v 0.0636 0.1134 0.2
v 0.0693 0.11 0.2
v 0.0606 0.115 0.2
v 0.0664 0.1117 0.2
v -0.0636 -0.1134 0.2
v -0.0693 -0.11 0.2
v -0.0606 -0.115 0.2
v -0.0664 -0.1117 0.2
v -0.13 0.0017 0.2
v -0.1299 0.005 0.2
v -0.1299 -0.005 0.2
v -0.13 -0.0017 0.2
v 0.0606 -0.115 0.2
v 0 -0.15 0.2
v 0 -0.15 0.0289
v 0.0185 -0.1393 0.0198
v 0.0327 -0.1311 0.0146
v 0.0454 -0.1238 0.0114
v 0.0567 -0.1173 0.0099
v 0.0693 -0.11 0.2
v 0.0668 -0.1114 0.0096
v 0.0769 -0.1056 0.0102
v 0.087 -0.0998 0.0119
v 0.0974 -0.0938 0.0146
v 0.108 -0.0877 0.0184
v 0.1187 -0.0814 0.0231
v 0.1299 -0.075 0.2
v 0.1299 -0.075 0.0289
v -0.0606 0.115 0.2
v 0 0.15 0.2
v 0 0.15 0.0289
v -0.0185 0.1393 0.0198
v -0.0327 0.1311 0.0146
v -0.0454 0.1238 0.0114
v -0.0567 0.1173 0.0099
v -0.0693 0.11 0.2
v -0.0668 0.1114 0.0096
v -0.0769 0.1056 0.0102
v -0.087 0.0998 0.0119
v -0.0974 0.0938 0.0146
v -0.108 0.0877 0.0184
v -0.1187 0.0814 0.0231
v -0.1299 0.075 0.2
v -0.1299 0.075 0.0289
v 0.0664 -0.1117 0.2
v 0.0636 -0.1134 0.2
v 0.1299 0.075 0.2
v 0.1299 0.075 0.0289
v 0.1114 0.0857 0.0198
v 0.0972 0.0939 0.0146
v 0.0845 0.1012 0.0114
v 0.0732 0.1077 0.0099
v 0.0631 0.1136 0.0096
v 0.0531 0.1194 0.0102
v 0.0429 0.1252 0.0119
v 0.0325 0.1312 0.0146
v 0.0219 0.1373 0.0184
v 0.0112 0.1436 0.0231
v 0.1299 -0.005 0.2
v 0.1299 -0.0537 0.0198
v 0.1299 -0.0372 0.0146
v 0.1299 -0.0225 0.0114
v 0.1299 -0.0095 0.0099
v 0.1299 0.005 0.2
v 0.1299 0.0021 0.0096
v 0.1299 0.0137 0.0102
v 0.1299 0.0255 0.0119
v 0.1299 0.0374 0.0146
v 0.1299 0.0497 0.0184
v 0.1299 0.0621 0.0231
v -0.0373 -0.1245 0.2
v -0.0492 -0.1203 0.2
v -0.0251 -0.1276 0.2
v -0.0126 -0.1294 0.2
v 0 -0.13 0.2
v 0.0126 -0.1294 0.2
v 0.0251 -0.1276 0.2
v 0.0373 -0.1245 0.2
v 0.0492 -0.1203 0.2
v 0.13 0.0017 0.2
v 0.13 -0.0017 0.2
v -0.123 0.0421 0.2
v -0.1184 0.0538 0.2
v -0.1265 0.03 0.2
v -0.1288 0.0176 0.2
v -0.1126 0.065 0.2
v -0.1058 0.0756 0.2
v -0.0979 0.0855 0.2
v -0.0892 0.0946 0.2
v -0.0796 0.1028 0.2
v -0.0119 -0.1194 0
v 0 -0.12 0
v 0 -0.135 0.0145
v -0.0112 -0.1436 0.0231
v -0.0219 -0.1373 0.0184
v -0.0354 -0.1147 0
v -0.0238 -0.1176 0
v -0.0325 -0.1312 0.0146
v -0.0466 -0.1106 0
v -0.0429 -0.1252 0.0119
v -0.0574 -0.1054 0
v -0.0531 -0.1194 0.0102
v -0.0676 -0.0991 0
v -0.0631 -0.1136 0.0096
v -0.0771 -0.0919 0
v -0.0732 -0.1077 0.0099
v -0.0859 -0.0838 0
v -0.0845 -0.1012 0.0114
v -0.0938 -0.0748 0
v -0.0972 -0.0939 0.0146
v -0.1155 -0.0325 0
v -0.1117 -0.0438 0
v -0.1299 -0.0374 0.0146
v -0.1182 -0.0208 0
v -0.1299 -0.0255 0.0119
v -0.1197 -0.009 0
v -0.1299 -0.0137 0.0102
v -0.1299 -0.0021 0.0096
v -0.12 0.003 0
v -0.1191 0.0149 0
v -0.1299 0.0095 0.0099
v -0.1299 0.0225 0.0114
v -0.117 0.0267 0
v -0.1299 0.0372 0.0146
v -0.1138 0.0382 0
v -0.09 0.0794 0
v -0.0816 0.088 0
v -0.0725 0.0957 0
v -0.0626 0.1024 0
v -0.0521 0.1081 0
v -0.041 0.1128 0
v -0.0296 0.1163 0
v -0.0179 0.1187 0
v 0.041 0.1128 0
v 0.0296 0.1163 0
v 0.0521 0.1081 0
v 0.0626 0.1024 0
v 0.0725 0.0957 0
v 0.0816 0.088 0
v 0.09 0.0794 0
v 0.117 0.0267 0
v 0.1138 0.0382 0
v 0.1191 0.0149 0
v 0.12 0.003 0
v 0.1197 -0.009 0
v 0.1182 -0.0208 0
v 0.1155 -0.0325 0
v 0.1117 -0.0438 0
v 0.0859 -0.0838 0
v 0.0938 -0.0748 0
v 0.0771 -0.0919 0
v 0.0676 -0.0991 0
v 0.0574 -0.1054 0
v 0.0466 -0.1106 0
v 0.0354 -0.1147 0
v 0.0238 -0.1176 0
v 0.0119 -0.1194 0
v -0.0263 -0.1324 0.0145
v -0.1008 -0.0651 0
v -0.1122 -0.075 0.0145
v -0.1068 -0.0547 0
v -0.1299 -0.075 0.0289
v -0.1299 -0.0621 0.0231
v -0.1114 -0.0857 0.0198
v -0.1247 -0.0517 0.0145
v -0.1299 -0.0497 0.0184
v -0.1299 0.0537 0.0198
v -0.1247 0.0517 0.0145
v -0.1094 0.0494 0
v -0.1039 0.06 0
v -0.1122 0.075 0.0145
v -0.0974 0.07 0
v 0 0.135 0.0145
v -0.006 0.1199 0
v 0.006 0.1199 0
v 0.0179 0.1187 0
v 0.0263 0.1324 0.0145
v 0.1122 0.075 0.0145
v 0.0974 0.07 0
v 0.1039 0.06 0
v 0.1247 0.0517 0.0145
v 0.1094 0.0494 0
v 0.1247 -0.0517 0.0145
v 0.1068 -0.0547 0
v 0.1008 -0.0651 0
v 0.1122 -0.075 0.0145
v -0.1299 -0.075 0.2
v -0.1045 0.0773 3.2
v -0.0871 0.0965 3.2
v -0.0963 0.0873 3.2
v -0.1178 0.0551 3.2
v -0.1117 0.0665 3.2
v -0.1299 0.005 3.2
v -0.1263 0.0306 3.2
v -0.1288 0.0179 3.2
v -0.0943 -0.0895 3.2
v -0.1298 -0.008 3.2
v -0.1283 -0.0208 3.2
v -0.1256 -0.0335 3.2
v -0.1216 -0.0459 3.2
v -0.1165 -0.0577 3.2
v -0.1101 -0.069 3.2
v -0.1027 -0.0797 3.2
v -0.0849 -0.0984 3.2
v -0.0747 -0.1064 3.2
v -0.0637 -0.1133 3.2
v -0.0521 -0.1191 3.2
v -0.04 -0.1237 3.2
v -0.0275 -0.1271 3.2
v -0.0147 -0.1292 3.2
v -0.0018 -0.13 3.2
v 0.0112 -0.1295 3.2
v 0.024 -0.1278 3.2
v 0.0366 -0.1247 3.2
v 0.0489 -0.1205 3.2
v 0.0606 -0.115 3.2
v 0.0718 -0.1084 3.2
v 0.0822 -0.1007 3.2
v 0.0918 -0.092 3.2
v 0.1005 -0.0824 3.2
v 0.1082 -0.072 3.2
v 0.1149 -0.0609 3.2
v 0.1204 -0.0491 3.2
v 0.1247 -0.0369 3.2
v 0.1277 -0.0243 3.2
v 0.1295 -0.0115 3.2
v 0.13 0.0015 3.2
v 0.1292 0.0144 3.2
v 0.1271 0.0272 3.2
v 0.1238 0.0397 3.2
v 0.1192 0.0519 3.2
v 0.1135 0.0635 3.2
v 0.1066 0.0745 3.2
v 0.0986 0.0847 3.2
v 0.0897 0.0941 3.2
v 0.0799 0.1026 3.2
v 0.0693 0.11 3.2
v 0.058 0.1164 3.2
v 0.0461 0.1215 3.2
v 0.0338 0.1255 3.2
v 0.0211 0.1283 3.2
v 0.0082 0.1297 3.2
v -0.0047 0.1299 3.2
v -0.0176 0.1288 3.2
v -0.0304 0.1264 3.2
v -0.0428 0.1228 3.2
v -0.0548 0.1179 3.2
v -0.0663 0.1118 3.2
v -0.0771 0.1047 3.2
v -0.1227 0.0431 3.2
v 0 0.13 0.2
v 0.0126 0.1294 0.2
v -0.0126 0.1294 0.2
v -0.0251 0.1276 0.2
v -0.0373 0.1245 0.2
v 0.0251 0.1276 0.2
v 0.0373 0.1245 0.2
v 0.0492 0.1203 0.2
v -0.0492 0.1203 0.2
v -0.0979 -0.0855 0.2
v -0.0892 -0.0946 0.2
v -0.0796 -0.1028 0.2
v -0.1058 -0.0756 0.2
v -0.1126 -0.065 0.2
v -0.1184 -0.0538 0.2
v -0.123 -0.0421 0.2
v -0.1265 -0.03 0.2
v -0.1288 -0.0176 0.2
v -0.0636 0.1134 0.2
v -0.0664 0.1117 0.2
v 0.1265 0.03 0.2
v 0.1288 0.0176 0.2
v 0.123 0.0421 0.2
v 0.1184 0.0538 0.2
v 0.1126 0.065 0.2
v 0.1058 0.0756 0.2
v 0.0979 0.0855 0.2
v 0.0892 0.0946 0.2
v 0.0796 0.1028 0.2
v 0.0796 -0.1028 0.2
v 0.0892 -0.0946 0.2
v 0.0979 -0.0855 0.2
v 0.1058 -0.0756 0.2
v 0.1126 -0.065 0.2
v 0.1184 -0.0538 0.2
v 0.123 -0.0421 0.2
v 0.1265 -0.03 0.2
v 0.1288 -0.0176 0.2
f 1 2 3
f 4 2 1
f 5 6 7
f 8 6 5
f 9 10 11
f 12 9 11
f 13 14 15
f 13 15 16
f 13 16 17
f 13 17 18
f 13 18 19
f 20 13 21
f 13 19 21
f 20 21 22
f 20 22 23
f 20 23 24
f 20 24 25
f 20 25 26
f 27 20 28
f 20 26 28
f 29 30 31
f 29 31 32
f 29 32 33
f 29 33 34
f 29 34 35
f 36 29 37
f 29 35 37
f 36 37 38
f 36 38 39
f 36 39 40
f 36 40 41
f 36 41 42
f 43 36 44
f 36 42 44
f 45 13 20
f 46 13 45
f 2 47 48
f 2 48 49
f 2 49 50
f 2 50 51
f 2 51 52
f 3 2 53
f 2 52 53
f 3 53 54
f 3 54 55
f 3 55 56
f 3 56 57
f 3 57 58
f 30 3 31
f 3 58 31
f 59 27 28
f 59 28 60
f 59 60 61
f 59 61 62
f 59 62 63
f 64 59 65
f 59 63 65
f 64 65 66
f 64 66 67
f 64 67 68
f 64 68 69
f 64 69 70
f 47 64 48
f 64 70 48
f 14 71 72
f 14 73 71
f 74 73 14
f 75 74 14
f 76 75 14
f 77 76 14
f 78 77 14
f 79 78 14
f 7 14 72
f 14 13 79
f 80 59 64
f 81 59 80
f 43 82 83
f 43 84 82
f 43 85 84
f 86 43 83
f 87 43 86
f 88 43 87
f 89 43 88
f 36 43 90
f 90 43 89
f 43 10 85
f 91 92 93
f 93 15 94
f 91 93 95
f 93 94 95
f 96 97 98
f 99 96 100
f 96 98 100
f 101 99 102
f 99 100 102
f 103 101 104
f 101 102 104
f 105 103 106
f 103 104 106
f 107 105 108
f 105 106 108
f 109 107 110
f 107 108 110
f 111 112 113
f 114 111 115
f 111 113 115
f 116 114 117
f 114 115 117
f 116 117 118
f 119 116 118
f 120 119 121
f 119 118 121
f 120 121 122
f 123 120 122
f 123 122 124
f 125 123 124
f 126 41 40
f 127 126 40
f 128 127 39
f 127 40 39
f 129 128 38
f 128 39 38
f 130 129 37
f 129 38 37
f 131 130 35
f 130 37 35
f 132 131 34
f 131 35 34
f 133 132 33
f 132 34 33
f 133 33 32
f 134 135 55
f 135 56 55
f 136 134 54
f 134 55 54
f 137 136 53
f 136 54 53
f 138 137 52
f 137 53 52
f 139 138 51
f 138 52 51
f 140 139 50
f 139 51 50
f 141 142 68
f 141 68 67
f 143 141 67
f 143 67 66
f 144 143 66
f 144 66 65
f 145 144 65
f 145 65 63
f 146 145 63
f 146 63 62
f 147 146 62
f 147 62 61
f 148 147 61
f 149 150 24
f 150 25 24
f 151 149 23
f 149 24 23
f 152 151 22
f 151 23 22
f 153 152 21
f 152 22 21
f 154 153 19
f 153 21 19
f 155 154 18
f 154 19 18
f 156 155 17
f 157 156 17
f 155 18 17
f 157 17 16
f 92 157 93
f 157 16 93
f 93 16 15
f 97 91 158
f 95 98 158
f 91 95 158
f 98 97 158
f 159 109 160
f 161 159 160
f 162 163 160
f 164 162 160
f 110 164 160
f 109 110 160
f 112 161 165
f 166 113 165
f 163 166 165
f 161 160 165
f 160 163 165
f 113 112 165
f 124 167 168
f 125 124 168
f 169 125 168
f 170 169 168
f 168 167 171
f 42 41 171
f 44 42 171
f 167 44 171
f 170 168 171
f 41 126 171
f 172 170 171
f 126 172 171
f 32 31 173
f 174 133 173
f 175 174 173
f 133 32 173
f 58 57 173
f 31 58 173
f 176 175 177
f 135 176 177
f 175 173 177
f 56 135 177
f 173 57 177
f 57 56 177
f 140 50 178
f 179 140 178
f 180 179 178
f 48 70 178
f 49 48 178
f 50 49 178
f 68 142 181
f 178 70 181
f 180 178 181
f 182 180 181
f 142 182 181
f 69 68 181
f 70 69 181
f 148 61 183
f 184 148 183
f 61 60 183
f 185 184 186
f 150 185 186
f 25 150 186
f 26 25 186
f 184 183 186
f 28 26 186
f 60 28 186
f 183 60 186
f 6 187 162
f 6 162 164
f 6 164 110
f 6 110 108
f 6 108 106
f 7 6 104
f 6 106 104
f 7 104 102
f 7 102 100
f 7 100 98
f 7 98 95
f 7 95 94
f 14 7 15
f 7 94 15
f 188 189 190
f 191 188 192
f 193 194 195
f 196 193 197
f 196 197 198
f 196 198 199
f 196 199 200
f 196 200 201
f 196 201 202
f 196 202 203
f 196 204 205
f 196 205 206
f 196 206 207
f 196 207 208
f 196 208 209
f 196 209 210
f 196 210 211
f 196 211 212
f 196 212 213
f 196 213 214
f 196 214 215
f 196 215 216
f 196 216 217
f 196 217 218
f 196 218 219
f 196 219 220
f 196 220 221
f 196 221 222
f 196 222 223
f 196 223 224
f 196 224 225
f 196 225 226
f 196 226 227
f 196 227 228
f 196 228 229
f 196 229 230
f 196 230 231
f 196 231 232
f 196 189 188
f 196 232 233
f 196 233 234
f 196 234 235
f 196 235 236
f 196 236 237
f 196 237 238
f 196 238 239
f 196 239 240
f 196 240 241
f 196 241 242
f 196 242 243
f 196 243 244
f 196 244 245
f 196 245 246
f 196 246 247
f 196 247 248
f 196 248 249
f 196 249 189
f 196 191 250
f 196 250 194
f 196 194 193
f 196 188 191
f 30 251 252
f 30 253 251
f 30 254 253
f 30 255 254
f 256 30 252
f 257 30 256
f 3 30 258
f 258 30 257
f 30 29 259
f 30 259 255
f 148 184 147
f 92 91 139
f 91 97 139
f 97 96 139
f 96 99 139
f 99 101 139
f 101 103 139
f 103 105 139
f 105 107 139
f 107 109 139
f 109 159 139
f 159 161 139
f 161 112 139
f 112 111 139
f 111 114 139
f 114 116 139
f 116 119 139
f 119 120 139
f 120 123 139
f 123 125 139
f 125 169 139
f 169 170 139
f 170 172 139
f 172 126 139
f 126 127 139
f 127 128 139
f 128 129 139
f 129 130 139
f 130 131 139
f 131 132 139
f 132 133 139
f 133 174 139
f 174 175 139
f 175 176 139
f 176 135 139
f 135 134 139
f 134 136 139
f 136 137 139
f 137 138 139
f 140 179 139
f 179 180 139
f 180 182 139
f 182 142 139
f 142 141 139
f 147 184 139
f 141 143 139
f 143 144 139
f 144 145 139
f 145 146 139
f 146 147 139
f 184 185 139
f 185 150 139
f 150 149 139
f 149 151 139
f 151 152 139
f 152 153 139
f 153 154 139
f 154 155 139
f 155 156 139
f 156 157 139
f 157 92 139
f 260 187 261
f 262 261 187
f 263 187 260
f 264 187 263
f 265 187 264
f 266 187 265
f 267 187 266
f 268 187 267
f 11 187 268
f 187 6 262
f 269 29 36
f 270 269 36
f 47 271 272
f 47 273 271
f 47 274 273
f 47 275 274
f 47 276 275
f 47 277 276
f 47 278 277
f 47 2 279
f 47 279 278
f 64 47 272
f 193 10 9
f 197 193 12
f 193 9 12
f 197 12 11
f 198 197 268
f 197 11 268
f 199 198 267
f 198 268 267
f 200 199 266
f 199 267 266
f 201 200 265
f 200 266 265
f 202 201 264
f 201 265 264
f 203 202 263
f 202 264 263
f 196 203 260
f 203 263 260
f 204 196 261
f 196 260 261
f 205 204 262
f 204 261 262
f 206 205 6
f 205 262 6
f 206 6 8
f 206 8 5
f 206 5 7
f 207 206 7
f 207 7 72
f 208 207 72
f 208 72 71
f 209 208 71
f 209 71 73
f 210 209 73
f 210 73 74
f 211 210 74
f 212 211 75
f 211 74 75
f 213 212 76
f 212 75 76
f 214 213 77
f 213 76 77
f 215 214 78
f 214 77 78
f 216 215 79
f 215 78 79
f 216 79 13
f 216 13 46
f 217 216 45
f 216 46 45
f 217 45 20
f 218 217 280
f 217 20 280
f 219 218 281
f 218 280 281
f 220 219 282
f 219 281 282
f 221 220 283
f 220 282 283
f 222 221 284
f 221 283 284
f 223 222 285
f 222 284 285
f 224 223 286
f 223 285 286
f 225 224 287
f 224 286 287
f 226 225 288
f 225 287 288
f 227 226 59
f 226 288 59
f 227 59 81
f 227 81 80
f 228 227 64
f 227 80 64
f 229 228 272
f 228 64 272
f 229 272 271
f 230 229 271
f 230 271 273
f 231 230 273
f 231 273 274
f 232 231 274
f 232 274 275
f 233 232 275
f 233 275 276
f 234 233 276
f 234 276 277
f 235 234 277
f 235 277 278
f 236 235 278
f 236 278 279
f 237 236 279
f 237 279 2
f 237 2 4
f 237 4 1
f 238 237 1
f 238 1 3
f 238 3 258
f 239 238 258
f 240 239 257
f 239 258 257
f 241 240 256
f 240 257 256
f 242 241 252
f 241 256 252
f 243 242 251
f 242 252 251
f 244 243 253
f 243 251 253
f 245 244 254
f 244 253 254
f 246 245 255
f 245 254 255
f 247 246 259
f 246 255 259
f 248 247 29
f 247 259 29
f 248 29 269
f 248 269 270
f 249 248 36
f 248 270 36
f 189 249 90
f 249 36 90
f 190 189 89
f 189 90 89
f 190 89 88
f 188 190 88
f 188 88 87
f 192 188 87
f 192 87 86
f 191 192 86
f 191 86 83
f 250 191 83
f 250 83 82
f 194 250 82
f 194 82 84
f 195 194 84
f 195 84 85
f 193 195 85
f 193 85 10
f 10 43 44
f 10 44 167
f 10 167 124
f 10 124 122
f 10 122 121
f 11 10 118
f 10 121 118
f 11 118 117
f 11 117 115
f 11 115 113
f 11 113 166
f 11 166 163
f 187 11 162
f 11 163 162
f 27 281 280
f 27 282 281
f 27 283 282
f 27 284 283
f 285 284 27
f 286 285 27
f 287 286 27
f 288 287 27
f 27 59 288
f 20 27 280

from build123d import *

# Parameters (mm, degrees)
BOSS_EXTRUDE1_DEPTH = 0.2
SKETCH5_R           = 0.13
BOSS_EXTRUDE2_DEPTH = 3


with BuildPart() as part:
    # Sketch1 → Boss-Extrude1 (new body)
    with BuildSketch(Plane.XY):
        Polygon((0, 0.15), (-0.129903811, 0.075), (-0.129903811, -0.075), (0, -0.15), (0.129903811, -0.075), (0.129903811, 0.075), align=None)
    extrude(amount=BOSS_EXTRUDE1_DEPTH)

    # Sketch5 → Boss-Extrude2 (add)
    with BuildSketch(Plane.XY.offset(0.2)):
        with Locations(Location((0, 0, 0), (0, 0, 177.795772496))):
            Circle(SKETCH5_R)
    extrude(amount=BOSS_EXTRUDE2_DEPTH)

    # Sketch3 → Cut-Revolve2 (revolve, cut)
    with BuildSketch(Plane(origin=(0, 0, 0), x_dir=(0, 0, -1), z_dir=(1, 0, 0)), mode=Mode.PRIVATE) as cut_revolve2_sk:
        Polygon((-0.028916319, 0.15), (0, 0.15), (0, 0.12), align=None)
    revolve(cut_revolve2_sk.sketch.rotate(Axis((0, 0, 0.2), (0, 0, -1)), 180), axis=Axis((0, 0, 0.2), (0, 0, -1)), mode=Mode.SUBTRACT)


solid = part.part
